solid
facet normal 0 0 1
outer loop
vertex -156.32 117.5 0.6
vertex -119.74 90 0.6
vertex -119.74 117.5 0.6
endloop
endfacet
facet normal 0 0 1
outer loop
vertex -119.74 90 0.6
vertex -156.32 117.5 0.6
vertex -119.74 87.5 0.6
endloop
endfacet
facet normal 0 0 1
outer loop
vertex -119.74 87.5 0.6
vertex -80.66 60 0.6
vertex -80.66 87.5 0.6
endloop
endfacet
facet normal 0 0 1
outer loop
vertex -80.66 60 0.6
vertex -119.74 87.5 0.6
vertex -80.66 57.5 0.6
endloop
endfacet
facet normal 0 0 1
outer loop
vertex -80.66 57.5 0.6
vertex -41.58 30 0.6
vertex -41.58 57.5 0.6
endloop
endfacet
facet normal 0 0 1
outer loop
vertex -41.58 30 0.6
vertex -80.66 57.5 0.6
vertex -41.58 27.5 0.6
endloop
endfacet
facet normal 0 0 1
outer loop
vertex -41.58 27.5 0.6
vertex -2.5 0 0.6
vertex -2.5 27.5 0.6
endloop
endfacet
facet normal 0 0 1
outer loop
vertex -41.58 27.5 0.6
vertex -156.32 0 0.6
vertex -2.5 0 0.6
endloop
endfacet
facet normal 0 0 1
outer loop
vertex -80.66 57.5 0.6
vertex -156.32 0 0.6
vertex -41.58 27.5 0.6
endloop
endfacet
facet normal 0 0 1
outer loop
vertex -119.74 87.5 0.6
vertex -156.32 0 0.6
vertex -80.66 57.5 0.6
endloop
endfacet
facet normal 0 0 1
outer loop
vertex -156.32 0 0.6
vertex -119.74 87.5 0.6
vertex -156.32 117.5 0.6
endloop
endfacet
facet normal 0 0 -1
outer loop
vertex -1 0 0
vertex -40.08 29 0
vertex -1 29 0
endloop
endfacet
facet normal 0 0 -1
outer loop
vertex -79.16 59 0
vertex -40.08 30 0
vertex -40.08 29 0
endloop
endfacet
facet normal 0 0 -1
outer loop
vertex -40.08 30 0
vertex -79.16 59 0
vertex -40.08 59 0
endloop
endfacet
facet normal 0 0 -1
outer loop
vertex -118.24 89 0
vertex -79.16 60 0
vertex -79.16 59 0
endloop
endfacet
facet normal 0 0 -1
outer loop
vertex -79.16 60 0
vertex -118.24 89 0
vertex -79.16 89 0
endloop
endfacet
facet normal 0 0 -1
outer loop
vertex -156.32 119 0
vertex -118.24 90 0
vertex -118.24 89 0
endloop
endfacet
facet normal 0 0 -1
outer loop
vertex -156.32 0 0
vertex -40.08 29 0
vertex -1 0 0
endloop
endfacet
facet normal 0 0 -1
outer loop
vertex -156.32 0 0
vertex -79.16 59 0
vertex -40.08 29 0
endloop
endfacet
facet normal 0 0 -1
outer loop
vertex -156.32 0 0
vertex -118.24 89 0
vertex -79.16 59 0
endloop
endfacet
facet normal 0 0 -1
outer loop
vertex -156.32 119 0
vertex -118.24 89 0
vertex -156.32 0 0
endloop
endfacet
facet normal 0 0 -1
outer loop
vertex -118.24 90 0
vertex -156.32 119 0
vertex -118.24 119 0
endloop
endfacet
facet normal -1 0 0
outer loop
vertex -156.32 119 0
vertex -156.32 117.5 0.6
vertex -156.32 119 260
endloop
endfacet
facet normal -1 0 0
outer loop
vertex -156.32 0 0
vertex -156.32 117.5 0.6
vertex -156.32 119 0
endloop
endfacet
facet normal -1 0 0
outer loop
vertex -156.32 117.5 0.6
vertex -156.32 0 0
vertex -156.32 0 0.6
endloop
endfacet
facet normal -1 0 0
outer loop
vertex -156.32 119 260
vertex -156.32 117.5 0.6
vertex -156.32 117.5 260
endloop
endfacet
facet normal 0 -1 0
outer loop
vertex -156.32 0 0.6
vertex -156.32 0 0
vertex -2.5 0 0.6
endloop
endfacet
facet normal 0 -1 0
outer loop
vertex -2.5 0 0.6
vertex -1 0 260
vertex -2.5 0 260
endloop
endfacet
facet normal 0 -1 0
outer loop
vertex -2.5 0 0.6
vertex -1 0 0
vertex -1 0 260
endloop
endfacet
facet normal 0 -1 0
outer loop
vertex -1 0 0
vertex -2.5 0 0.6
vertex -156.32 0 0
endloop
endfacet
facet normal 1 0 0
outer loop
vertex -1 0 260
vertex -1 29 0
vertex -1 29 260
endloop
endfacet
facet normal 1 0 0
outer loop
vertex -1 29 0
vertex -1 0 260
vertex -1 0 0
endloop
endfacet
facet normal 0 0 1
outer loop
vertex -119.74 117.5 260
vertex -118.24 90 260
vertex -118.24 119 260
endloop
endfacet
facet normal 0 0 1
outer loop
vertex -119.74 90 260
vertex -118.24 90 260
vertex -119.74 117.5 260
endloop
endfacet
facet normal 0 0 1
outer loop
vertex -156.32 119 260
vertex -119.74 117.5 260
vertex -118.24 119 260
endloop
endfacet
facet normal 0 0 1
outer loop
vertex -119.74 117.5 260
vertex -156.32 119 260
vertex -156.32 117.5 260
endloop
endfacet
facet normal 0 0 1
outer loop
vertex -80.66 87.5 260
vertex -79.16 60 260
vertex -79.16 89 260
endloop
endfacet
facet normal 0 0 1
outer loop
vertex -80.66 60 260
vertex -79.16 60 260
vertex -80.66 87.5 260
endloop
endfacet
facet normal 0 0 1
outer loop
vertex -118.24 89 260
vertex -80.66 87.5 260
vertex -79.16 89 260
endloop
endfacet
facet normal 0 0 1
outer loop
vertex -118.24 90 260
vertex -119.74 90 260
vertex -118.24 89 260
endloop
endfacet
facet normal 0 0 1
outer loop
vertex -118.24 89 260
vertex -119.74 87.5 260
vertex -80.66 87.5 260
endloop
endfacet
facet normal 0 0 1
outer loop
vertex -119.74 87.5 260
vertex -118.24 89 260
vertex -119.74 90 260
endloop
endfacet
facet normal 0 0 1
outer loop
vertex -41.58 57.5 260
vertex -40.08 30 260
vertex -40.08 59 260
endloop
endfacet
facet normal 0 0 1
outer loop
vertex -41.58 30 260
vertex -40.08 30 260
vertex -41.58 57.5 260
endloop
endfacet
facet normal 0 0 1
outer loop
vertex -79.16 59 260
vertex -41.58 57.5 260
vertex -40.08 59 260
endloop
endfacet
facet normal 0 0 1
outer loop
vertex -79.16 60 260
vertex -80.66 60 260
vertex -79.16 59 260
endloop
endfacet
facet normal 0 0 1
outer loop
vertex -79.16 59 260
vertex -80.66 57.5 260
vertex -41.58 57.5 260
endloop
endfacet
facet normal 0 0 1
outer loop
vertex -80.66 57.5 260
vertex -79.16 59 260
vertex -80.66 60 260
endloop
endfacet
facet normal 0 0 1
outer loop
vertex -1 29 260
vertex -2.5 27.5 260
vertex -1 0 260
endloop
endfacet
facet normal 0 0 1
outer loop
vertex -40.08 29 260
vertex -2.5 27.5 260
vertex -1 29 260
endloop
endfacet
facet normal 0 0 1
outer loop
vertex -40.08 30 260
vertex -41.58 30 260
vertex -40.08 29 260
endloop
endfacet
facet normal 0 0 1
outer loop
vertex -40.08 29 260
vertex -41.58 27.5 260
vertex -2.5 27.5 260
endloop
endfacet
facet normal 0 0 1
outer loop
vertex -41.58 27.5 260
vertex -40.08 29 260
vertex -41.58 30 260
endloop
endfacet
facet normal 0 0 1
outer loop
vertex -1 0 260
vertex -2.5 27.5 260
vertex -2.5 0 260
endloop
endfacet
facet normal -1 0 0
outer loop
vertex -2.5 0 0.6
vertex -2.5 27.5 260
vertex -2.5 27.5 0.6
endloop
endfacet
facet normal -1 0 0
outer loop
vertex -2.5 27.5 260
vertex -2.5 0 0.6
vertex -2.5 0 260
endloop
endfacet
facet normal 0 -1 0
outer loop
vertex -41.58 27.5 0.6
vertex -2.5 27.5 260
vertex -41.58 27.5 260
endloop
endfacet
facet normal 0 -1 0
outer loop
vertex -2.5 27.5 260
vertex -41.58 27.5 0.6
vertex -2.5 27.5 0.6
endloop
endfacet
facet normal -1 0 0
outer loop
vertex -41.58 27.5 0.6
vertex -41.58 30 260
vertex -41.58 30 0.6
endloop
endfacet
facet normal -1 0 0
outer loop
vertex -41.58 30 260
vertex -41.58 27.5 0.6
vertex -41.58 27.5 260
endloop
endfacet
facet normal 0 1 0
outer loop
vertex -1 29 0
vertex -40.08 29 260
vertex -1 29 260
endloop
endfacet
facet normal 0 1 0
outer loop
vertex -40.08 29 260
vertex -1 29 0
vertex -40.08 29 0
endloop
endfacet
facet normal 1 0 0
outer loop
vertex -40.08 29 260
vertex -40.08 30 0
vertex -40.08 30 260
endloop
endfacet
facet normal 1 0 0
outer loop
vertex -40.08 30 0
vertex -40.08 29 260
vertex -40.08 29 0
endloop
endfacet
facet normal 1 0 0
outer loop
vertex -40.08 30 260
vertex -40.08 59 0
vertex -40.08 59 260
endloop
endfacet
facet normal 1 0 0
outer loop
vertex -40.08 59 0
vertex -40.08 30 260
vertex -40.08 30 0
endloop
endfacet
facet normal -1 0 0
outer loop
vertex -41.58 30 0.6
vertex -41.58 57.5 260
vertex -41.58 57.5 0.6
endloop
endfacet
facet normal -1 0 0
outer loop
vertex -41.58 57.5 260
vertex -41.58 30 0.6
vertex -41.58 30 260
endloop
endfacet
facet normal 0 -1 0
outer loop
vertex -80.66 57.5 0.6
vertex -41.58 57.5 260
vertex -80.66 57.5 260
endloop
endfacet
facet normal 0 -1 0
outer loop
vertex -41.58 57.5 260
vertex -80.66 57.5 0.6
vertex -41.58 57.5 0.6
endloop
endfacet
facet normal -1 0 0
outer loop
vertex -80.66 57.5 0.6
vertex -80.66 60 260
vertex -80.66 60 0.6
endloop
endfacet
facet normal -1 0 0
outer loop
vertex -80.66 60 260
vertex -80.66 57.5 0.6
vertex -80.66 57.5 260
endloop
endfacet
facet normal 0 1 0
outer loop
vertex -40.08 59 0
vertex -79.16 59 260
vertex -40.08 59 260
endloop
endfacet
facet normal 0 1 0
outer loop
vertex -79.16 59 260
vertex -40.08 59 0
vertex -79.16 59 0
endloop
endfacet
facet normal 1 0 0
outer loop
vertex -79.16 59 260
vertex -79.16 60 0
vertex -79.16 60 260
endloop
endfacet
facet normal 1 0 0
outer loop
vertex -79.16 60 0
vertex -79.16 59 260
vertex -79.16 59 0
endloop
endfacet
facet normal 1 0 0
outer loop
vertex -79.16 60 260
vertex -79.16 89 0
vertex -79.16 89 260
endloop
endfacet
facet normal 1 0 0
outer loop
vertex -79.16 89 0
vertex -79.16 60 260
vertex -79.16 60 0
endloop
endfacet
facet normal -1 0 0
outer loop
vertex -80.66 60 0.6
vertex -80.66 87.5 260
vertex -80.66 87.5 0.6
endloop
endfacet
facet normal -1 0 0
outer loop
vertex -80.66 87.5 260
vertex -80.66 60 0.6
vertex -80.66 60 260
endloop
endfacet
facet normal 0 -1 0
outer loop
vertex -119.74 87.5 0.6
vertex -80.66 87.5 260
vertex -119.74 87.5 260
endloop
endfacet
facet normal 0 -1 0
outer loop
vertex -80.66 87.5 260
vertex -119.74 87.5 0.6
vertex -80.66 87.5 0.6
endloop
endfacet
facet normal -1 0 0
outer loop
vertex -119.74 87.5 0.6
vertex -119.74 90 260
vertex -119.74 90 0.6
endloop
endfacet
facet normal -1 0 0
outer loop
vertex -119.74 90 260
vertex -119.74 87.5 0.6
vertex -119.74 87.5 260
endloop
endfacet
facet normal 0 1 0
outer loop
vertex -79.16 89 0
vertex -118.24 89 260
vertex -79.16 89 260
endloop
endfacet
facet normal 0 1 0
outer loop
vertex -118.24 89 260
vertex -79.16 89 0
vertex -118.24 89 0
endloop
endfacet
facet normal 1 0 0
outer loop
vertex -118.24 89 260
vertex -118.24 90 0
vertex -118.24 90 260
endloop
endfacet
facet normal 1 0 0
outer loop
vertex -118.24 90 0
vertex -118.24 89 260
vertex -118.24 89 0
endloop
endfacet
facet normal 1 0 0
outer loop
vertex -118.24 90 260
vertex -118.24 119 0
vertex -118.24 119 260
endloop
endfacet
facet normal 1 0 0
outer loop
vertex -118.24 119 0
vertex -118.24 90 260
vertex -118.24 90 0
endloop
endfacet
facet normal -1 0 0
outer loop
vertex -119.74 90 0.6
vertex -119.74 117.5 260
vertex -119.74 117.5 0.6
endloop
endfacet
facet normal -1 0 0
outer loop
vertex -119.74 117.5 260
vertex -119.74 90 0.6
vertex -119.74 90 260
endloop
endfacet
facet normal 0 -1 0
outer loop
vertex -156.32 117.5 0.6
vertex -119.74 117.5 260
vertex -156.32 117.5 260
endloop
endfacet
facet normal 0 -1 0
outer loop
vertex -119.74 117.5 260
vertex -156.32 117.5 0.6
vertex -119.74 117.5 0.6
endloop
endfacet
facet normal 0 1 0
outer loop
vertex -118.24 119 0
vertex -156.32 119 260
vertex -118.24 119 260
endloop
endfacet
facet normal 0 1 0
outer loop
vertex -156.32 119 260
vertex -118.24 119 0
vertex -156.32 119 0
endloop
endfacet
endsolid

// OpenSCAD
base_w = 117.24/3;
base_h = 150/5;
base_l = 150+110;
 foo_gap = 4;
 slit_t =0.1;
 line_w=0.5;
 layer_h=0.2;
step_t=line_w*3;
step_w=base_w+step_t;
shelves=5;

module shelf() {
  cube([base_w, base_h, base_l]);
}

module stand() {
  for(i=[0:shelves-1]) {
    translate([-i*base_w, i*base_h]) shelf();
  }
}

module step_riser() {
  // riser
  translate([-1-step_t,0]) cube([step_t, base_h-1-step_t, base_l]);
}

module step() {
    step_riser();
  //tread
  translate([-1-step_t-base_w, base_h-1-step_t]) cube([step_w, step_t, base_l]);
  //filler
  translate([-1-step_t-base_w, base_h-1]) cube([step_t, 1, base_l]);
}

module cover() {
  foo(0,layer_h*3);
  for(i=[0:shelves-3]) {
    translate([-i*base_w, i*base_h]) step();
  }
  translate([-(shelves-2)*base_w, (shelves-2)*base_h]) step_riser();
  //top tread
  translate([-(shelves-1)*base_w, (shelves-1)*base_h-1-step_t]) cube([step_w-step_t-1, step_t, base_l]);
}

module foo(gap=foo_gap, l=base_l) {
  foo_h=base_h-step_t-gap;
  for (i=[0:shelves-2]) {
    translate([-(shelves-1)*base_w, base_h*((shelves-2)-i)]) cube([base_w*(i+1)-step_t-gap, foo_h, l]);
  }
  for (i=[1:shelves-2]) {
    translate([-(shelves-1)*base_w, base_h*((shelves-2)-i)+foo_h]) cube([base_w*(i)-step_t-gap, step_t+gap, l]);
  }
}

// slits for vase mode printing. Nevermind. I'll do it in the slicer.
module subtract() {
  corner1_x=-base_w-step_t-foo_gap;
  corner1_y=base_h*2-step_t-foo_gap;
  linear_extrude(base_l) polygon([
  [-base_w*3+line_w, line_w],
  [-base_w*3+line_w, line_w+slit_t],
  [corner1_x, corner1_y],
  [corner1_x, corner1_y-slit_t]
  ]);
  
}

%stand();
cover();
% color("green") difference() {
  foo();
  #subtract();
}
